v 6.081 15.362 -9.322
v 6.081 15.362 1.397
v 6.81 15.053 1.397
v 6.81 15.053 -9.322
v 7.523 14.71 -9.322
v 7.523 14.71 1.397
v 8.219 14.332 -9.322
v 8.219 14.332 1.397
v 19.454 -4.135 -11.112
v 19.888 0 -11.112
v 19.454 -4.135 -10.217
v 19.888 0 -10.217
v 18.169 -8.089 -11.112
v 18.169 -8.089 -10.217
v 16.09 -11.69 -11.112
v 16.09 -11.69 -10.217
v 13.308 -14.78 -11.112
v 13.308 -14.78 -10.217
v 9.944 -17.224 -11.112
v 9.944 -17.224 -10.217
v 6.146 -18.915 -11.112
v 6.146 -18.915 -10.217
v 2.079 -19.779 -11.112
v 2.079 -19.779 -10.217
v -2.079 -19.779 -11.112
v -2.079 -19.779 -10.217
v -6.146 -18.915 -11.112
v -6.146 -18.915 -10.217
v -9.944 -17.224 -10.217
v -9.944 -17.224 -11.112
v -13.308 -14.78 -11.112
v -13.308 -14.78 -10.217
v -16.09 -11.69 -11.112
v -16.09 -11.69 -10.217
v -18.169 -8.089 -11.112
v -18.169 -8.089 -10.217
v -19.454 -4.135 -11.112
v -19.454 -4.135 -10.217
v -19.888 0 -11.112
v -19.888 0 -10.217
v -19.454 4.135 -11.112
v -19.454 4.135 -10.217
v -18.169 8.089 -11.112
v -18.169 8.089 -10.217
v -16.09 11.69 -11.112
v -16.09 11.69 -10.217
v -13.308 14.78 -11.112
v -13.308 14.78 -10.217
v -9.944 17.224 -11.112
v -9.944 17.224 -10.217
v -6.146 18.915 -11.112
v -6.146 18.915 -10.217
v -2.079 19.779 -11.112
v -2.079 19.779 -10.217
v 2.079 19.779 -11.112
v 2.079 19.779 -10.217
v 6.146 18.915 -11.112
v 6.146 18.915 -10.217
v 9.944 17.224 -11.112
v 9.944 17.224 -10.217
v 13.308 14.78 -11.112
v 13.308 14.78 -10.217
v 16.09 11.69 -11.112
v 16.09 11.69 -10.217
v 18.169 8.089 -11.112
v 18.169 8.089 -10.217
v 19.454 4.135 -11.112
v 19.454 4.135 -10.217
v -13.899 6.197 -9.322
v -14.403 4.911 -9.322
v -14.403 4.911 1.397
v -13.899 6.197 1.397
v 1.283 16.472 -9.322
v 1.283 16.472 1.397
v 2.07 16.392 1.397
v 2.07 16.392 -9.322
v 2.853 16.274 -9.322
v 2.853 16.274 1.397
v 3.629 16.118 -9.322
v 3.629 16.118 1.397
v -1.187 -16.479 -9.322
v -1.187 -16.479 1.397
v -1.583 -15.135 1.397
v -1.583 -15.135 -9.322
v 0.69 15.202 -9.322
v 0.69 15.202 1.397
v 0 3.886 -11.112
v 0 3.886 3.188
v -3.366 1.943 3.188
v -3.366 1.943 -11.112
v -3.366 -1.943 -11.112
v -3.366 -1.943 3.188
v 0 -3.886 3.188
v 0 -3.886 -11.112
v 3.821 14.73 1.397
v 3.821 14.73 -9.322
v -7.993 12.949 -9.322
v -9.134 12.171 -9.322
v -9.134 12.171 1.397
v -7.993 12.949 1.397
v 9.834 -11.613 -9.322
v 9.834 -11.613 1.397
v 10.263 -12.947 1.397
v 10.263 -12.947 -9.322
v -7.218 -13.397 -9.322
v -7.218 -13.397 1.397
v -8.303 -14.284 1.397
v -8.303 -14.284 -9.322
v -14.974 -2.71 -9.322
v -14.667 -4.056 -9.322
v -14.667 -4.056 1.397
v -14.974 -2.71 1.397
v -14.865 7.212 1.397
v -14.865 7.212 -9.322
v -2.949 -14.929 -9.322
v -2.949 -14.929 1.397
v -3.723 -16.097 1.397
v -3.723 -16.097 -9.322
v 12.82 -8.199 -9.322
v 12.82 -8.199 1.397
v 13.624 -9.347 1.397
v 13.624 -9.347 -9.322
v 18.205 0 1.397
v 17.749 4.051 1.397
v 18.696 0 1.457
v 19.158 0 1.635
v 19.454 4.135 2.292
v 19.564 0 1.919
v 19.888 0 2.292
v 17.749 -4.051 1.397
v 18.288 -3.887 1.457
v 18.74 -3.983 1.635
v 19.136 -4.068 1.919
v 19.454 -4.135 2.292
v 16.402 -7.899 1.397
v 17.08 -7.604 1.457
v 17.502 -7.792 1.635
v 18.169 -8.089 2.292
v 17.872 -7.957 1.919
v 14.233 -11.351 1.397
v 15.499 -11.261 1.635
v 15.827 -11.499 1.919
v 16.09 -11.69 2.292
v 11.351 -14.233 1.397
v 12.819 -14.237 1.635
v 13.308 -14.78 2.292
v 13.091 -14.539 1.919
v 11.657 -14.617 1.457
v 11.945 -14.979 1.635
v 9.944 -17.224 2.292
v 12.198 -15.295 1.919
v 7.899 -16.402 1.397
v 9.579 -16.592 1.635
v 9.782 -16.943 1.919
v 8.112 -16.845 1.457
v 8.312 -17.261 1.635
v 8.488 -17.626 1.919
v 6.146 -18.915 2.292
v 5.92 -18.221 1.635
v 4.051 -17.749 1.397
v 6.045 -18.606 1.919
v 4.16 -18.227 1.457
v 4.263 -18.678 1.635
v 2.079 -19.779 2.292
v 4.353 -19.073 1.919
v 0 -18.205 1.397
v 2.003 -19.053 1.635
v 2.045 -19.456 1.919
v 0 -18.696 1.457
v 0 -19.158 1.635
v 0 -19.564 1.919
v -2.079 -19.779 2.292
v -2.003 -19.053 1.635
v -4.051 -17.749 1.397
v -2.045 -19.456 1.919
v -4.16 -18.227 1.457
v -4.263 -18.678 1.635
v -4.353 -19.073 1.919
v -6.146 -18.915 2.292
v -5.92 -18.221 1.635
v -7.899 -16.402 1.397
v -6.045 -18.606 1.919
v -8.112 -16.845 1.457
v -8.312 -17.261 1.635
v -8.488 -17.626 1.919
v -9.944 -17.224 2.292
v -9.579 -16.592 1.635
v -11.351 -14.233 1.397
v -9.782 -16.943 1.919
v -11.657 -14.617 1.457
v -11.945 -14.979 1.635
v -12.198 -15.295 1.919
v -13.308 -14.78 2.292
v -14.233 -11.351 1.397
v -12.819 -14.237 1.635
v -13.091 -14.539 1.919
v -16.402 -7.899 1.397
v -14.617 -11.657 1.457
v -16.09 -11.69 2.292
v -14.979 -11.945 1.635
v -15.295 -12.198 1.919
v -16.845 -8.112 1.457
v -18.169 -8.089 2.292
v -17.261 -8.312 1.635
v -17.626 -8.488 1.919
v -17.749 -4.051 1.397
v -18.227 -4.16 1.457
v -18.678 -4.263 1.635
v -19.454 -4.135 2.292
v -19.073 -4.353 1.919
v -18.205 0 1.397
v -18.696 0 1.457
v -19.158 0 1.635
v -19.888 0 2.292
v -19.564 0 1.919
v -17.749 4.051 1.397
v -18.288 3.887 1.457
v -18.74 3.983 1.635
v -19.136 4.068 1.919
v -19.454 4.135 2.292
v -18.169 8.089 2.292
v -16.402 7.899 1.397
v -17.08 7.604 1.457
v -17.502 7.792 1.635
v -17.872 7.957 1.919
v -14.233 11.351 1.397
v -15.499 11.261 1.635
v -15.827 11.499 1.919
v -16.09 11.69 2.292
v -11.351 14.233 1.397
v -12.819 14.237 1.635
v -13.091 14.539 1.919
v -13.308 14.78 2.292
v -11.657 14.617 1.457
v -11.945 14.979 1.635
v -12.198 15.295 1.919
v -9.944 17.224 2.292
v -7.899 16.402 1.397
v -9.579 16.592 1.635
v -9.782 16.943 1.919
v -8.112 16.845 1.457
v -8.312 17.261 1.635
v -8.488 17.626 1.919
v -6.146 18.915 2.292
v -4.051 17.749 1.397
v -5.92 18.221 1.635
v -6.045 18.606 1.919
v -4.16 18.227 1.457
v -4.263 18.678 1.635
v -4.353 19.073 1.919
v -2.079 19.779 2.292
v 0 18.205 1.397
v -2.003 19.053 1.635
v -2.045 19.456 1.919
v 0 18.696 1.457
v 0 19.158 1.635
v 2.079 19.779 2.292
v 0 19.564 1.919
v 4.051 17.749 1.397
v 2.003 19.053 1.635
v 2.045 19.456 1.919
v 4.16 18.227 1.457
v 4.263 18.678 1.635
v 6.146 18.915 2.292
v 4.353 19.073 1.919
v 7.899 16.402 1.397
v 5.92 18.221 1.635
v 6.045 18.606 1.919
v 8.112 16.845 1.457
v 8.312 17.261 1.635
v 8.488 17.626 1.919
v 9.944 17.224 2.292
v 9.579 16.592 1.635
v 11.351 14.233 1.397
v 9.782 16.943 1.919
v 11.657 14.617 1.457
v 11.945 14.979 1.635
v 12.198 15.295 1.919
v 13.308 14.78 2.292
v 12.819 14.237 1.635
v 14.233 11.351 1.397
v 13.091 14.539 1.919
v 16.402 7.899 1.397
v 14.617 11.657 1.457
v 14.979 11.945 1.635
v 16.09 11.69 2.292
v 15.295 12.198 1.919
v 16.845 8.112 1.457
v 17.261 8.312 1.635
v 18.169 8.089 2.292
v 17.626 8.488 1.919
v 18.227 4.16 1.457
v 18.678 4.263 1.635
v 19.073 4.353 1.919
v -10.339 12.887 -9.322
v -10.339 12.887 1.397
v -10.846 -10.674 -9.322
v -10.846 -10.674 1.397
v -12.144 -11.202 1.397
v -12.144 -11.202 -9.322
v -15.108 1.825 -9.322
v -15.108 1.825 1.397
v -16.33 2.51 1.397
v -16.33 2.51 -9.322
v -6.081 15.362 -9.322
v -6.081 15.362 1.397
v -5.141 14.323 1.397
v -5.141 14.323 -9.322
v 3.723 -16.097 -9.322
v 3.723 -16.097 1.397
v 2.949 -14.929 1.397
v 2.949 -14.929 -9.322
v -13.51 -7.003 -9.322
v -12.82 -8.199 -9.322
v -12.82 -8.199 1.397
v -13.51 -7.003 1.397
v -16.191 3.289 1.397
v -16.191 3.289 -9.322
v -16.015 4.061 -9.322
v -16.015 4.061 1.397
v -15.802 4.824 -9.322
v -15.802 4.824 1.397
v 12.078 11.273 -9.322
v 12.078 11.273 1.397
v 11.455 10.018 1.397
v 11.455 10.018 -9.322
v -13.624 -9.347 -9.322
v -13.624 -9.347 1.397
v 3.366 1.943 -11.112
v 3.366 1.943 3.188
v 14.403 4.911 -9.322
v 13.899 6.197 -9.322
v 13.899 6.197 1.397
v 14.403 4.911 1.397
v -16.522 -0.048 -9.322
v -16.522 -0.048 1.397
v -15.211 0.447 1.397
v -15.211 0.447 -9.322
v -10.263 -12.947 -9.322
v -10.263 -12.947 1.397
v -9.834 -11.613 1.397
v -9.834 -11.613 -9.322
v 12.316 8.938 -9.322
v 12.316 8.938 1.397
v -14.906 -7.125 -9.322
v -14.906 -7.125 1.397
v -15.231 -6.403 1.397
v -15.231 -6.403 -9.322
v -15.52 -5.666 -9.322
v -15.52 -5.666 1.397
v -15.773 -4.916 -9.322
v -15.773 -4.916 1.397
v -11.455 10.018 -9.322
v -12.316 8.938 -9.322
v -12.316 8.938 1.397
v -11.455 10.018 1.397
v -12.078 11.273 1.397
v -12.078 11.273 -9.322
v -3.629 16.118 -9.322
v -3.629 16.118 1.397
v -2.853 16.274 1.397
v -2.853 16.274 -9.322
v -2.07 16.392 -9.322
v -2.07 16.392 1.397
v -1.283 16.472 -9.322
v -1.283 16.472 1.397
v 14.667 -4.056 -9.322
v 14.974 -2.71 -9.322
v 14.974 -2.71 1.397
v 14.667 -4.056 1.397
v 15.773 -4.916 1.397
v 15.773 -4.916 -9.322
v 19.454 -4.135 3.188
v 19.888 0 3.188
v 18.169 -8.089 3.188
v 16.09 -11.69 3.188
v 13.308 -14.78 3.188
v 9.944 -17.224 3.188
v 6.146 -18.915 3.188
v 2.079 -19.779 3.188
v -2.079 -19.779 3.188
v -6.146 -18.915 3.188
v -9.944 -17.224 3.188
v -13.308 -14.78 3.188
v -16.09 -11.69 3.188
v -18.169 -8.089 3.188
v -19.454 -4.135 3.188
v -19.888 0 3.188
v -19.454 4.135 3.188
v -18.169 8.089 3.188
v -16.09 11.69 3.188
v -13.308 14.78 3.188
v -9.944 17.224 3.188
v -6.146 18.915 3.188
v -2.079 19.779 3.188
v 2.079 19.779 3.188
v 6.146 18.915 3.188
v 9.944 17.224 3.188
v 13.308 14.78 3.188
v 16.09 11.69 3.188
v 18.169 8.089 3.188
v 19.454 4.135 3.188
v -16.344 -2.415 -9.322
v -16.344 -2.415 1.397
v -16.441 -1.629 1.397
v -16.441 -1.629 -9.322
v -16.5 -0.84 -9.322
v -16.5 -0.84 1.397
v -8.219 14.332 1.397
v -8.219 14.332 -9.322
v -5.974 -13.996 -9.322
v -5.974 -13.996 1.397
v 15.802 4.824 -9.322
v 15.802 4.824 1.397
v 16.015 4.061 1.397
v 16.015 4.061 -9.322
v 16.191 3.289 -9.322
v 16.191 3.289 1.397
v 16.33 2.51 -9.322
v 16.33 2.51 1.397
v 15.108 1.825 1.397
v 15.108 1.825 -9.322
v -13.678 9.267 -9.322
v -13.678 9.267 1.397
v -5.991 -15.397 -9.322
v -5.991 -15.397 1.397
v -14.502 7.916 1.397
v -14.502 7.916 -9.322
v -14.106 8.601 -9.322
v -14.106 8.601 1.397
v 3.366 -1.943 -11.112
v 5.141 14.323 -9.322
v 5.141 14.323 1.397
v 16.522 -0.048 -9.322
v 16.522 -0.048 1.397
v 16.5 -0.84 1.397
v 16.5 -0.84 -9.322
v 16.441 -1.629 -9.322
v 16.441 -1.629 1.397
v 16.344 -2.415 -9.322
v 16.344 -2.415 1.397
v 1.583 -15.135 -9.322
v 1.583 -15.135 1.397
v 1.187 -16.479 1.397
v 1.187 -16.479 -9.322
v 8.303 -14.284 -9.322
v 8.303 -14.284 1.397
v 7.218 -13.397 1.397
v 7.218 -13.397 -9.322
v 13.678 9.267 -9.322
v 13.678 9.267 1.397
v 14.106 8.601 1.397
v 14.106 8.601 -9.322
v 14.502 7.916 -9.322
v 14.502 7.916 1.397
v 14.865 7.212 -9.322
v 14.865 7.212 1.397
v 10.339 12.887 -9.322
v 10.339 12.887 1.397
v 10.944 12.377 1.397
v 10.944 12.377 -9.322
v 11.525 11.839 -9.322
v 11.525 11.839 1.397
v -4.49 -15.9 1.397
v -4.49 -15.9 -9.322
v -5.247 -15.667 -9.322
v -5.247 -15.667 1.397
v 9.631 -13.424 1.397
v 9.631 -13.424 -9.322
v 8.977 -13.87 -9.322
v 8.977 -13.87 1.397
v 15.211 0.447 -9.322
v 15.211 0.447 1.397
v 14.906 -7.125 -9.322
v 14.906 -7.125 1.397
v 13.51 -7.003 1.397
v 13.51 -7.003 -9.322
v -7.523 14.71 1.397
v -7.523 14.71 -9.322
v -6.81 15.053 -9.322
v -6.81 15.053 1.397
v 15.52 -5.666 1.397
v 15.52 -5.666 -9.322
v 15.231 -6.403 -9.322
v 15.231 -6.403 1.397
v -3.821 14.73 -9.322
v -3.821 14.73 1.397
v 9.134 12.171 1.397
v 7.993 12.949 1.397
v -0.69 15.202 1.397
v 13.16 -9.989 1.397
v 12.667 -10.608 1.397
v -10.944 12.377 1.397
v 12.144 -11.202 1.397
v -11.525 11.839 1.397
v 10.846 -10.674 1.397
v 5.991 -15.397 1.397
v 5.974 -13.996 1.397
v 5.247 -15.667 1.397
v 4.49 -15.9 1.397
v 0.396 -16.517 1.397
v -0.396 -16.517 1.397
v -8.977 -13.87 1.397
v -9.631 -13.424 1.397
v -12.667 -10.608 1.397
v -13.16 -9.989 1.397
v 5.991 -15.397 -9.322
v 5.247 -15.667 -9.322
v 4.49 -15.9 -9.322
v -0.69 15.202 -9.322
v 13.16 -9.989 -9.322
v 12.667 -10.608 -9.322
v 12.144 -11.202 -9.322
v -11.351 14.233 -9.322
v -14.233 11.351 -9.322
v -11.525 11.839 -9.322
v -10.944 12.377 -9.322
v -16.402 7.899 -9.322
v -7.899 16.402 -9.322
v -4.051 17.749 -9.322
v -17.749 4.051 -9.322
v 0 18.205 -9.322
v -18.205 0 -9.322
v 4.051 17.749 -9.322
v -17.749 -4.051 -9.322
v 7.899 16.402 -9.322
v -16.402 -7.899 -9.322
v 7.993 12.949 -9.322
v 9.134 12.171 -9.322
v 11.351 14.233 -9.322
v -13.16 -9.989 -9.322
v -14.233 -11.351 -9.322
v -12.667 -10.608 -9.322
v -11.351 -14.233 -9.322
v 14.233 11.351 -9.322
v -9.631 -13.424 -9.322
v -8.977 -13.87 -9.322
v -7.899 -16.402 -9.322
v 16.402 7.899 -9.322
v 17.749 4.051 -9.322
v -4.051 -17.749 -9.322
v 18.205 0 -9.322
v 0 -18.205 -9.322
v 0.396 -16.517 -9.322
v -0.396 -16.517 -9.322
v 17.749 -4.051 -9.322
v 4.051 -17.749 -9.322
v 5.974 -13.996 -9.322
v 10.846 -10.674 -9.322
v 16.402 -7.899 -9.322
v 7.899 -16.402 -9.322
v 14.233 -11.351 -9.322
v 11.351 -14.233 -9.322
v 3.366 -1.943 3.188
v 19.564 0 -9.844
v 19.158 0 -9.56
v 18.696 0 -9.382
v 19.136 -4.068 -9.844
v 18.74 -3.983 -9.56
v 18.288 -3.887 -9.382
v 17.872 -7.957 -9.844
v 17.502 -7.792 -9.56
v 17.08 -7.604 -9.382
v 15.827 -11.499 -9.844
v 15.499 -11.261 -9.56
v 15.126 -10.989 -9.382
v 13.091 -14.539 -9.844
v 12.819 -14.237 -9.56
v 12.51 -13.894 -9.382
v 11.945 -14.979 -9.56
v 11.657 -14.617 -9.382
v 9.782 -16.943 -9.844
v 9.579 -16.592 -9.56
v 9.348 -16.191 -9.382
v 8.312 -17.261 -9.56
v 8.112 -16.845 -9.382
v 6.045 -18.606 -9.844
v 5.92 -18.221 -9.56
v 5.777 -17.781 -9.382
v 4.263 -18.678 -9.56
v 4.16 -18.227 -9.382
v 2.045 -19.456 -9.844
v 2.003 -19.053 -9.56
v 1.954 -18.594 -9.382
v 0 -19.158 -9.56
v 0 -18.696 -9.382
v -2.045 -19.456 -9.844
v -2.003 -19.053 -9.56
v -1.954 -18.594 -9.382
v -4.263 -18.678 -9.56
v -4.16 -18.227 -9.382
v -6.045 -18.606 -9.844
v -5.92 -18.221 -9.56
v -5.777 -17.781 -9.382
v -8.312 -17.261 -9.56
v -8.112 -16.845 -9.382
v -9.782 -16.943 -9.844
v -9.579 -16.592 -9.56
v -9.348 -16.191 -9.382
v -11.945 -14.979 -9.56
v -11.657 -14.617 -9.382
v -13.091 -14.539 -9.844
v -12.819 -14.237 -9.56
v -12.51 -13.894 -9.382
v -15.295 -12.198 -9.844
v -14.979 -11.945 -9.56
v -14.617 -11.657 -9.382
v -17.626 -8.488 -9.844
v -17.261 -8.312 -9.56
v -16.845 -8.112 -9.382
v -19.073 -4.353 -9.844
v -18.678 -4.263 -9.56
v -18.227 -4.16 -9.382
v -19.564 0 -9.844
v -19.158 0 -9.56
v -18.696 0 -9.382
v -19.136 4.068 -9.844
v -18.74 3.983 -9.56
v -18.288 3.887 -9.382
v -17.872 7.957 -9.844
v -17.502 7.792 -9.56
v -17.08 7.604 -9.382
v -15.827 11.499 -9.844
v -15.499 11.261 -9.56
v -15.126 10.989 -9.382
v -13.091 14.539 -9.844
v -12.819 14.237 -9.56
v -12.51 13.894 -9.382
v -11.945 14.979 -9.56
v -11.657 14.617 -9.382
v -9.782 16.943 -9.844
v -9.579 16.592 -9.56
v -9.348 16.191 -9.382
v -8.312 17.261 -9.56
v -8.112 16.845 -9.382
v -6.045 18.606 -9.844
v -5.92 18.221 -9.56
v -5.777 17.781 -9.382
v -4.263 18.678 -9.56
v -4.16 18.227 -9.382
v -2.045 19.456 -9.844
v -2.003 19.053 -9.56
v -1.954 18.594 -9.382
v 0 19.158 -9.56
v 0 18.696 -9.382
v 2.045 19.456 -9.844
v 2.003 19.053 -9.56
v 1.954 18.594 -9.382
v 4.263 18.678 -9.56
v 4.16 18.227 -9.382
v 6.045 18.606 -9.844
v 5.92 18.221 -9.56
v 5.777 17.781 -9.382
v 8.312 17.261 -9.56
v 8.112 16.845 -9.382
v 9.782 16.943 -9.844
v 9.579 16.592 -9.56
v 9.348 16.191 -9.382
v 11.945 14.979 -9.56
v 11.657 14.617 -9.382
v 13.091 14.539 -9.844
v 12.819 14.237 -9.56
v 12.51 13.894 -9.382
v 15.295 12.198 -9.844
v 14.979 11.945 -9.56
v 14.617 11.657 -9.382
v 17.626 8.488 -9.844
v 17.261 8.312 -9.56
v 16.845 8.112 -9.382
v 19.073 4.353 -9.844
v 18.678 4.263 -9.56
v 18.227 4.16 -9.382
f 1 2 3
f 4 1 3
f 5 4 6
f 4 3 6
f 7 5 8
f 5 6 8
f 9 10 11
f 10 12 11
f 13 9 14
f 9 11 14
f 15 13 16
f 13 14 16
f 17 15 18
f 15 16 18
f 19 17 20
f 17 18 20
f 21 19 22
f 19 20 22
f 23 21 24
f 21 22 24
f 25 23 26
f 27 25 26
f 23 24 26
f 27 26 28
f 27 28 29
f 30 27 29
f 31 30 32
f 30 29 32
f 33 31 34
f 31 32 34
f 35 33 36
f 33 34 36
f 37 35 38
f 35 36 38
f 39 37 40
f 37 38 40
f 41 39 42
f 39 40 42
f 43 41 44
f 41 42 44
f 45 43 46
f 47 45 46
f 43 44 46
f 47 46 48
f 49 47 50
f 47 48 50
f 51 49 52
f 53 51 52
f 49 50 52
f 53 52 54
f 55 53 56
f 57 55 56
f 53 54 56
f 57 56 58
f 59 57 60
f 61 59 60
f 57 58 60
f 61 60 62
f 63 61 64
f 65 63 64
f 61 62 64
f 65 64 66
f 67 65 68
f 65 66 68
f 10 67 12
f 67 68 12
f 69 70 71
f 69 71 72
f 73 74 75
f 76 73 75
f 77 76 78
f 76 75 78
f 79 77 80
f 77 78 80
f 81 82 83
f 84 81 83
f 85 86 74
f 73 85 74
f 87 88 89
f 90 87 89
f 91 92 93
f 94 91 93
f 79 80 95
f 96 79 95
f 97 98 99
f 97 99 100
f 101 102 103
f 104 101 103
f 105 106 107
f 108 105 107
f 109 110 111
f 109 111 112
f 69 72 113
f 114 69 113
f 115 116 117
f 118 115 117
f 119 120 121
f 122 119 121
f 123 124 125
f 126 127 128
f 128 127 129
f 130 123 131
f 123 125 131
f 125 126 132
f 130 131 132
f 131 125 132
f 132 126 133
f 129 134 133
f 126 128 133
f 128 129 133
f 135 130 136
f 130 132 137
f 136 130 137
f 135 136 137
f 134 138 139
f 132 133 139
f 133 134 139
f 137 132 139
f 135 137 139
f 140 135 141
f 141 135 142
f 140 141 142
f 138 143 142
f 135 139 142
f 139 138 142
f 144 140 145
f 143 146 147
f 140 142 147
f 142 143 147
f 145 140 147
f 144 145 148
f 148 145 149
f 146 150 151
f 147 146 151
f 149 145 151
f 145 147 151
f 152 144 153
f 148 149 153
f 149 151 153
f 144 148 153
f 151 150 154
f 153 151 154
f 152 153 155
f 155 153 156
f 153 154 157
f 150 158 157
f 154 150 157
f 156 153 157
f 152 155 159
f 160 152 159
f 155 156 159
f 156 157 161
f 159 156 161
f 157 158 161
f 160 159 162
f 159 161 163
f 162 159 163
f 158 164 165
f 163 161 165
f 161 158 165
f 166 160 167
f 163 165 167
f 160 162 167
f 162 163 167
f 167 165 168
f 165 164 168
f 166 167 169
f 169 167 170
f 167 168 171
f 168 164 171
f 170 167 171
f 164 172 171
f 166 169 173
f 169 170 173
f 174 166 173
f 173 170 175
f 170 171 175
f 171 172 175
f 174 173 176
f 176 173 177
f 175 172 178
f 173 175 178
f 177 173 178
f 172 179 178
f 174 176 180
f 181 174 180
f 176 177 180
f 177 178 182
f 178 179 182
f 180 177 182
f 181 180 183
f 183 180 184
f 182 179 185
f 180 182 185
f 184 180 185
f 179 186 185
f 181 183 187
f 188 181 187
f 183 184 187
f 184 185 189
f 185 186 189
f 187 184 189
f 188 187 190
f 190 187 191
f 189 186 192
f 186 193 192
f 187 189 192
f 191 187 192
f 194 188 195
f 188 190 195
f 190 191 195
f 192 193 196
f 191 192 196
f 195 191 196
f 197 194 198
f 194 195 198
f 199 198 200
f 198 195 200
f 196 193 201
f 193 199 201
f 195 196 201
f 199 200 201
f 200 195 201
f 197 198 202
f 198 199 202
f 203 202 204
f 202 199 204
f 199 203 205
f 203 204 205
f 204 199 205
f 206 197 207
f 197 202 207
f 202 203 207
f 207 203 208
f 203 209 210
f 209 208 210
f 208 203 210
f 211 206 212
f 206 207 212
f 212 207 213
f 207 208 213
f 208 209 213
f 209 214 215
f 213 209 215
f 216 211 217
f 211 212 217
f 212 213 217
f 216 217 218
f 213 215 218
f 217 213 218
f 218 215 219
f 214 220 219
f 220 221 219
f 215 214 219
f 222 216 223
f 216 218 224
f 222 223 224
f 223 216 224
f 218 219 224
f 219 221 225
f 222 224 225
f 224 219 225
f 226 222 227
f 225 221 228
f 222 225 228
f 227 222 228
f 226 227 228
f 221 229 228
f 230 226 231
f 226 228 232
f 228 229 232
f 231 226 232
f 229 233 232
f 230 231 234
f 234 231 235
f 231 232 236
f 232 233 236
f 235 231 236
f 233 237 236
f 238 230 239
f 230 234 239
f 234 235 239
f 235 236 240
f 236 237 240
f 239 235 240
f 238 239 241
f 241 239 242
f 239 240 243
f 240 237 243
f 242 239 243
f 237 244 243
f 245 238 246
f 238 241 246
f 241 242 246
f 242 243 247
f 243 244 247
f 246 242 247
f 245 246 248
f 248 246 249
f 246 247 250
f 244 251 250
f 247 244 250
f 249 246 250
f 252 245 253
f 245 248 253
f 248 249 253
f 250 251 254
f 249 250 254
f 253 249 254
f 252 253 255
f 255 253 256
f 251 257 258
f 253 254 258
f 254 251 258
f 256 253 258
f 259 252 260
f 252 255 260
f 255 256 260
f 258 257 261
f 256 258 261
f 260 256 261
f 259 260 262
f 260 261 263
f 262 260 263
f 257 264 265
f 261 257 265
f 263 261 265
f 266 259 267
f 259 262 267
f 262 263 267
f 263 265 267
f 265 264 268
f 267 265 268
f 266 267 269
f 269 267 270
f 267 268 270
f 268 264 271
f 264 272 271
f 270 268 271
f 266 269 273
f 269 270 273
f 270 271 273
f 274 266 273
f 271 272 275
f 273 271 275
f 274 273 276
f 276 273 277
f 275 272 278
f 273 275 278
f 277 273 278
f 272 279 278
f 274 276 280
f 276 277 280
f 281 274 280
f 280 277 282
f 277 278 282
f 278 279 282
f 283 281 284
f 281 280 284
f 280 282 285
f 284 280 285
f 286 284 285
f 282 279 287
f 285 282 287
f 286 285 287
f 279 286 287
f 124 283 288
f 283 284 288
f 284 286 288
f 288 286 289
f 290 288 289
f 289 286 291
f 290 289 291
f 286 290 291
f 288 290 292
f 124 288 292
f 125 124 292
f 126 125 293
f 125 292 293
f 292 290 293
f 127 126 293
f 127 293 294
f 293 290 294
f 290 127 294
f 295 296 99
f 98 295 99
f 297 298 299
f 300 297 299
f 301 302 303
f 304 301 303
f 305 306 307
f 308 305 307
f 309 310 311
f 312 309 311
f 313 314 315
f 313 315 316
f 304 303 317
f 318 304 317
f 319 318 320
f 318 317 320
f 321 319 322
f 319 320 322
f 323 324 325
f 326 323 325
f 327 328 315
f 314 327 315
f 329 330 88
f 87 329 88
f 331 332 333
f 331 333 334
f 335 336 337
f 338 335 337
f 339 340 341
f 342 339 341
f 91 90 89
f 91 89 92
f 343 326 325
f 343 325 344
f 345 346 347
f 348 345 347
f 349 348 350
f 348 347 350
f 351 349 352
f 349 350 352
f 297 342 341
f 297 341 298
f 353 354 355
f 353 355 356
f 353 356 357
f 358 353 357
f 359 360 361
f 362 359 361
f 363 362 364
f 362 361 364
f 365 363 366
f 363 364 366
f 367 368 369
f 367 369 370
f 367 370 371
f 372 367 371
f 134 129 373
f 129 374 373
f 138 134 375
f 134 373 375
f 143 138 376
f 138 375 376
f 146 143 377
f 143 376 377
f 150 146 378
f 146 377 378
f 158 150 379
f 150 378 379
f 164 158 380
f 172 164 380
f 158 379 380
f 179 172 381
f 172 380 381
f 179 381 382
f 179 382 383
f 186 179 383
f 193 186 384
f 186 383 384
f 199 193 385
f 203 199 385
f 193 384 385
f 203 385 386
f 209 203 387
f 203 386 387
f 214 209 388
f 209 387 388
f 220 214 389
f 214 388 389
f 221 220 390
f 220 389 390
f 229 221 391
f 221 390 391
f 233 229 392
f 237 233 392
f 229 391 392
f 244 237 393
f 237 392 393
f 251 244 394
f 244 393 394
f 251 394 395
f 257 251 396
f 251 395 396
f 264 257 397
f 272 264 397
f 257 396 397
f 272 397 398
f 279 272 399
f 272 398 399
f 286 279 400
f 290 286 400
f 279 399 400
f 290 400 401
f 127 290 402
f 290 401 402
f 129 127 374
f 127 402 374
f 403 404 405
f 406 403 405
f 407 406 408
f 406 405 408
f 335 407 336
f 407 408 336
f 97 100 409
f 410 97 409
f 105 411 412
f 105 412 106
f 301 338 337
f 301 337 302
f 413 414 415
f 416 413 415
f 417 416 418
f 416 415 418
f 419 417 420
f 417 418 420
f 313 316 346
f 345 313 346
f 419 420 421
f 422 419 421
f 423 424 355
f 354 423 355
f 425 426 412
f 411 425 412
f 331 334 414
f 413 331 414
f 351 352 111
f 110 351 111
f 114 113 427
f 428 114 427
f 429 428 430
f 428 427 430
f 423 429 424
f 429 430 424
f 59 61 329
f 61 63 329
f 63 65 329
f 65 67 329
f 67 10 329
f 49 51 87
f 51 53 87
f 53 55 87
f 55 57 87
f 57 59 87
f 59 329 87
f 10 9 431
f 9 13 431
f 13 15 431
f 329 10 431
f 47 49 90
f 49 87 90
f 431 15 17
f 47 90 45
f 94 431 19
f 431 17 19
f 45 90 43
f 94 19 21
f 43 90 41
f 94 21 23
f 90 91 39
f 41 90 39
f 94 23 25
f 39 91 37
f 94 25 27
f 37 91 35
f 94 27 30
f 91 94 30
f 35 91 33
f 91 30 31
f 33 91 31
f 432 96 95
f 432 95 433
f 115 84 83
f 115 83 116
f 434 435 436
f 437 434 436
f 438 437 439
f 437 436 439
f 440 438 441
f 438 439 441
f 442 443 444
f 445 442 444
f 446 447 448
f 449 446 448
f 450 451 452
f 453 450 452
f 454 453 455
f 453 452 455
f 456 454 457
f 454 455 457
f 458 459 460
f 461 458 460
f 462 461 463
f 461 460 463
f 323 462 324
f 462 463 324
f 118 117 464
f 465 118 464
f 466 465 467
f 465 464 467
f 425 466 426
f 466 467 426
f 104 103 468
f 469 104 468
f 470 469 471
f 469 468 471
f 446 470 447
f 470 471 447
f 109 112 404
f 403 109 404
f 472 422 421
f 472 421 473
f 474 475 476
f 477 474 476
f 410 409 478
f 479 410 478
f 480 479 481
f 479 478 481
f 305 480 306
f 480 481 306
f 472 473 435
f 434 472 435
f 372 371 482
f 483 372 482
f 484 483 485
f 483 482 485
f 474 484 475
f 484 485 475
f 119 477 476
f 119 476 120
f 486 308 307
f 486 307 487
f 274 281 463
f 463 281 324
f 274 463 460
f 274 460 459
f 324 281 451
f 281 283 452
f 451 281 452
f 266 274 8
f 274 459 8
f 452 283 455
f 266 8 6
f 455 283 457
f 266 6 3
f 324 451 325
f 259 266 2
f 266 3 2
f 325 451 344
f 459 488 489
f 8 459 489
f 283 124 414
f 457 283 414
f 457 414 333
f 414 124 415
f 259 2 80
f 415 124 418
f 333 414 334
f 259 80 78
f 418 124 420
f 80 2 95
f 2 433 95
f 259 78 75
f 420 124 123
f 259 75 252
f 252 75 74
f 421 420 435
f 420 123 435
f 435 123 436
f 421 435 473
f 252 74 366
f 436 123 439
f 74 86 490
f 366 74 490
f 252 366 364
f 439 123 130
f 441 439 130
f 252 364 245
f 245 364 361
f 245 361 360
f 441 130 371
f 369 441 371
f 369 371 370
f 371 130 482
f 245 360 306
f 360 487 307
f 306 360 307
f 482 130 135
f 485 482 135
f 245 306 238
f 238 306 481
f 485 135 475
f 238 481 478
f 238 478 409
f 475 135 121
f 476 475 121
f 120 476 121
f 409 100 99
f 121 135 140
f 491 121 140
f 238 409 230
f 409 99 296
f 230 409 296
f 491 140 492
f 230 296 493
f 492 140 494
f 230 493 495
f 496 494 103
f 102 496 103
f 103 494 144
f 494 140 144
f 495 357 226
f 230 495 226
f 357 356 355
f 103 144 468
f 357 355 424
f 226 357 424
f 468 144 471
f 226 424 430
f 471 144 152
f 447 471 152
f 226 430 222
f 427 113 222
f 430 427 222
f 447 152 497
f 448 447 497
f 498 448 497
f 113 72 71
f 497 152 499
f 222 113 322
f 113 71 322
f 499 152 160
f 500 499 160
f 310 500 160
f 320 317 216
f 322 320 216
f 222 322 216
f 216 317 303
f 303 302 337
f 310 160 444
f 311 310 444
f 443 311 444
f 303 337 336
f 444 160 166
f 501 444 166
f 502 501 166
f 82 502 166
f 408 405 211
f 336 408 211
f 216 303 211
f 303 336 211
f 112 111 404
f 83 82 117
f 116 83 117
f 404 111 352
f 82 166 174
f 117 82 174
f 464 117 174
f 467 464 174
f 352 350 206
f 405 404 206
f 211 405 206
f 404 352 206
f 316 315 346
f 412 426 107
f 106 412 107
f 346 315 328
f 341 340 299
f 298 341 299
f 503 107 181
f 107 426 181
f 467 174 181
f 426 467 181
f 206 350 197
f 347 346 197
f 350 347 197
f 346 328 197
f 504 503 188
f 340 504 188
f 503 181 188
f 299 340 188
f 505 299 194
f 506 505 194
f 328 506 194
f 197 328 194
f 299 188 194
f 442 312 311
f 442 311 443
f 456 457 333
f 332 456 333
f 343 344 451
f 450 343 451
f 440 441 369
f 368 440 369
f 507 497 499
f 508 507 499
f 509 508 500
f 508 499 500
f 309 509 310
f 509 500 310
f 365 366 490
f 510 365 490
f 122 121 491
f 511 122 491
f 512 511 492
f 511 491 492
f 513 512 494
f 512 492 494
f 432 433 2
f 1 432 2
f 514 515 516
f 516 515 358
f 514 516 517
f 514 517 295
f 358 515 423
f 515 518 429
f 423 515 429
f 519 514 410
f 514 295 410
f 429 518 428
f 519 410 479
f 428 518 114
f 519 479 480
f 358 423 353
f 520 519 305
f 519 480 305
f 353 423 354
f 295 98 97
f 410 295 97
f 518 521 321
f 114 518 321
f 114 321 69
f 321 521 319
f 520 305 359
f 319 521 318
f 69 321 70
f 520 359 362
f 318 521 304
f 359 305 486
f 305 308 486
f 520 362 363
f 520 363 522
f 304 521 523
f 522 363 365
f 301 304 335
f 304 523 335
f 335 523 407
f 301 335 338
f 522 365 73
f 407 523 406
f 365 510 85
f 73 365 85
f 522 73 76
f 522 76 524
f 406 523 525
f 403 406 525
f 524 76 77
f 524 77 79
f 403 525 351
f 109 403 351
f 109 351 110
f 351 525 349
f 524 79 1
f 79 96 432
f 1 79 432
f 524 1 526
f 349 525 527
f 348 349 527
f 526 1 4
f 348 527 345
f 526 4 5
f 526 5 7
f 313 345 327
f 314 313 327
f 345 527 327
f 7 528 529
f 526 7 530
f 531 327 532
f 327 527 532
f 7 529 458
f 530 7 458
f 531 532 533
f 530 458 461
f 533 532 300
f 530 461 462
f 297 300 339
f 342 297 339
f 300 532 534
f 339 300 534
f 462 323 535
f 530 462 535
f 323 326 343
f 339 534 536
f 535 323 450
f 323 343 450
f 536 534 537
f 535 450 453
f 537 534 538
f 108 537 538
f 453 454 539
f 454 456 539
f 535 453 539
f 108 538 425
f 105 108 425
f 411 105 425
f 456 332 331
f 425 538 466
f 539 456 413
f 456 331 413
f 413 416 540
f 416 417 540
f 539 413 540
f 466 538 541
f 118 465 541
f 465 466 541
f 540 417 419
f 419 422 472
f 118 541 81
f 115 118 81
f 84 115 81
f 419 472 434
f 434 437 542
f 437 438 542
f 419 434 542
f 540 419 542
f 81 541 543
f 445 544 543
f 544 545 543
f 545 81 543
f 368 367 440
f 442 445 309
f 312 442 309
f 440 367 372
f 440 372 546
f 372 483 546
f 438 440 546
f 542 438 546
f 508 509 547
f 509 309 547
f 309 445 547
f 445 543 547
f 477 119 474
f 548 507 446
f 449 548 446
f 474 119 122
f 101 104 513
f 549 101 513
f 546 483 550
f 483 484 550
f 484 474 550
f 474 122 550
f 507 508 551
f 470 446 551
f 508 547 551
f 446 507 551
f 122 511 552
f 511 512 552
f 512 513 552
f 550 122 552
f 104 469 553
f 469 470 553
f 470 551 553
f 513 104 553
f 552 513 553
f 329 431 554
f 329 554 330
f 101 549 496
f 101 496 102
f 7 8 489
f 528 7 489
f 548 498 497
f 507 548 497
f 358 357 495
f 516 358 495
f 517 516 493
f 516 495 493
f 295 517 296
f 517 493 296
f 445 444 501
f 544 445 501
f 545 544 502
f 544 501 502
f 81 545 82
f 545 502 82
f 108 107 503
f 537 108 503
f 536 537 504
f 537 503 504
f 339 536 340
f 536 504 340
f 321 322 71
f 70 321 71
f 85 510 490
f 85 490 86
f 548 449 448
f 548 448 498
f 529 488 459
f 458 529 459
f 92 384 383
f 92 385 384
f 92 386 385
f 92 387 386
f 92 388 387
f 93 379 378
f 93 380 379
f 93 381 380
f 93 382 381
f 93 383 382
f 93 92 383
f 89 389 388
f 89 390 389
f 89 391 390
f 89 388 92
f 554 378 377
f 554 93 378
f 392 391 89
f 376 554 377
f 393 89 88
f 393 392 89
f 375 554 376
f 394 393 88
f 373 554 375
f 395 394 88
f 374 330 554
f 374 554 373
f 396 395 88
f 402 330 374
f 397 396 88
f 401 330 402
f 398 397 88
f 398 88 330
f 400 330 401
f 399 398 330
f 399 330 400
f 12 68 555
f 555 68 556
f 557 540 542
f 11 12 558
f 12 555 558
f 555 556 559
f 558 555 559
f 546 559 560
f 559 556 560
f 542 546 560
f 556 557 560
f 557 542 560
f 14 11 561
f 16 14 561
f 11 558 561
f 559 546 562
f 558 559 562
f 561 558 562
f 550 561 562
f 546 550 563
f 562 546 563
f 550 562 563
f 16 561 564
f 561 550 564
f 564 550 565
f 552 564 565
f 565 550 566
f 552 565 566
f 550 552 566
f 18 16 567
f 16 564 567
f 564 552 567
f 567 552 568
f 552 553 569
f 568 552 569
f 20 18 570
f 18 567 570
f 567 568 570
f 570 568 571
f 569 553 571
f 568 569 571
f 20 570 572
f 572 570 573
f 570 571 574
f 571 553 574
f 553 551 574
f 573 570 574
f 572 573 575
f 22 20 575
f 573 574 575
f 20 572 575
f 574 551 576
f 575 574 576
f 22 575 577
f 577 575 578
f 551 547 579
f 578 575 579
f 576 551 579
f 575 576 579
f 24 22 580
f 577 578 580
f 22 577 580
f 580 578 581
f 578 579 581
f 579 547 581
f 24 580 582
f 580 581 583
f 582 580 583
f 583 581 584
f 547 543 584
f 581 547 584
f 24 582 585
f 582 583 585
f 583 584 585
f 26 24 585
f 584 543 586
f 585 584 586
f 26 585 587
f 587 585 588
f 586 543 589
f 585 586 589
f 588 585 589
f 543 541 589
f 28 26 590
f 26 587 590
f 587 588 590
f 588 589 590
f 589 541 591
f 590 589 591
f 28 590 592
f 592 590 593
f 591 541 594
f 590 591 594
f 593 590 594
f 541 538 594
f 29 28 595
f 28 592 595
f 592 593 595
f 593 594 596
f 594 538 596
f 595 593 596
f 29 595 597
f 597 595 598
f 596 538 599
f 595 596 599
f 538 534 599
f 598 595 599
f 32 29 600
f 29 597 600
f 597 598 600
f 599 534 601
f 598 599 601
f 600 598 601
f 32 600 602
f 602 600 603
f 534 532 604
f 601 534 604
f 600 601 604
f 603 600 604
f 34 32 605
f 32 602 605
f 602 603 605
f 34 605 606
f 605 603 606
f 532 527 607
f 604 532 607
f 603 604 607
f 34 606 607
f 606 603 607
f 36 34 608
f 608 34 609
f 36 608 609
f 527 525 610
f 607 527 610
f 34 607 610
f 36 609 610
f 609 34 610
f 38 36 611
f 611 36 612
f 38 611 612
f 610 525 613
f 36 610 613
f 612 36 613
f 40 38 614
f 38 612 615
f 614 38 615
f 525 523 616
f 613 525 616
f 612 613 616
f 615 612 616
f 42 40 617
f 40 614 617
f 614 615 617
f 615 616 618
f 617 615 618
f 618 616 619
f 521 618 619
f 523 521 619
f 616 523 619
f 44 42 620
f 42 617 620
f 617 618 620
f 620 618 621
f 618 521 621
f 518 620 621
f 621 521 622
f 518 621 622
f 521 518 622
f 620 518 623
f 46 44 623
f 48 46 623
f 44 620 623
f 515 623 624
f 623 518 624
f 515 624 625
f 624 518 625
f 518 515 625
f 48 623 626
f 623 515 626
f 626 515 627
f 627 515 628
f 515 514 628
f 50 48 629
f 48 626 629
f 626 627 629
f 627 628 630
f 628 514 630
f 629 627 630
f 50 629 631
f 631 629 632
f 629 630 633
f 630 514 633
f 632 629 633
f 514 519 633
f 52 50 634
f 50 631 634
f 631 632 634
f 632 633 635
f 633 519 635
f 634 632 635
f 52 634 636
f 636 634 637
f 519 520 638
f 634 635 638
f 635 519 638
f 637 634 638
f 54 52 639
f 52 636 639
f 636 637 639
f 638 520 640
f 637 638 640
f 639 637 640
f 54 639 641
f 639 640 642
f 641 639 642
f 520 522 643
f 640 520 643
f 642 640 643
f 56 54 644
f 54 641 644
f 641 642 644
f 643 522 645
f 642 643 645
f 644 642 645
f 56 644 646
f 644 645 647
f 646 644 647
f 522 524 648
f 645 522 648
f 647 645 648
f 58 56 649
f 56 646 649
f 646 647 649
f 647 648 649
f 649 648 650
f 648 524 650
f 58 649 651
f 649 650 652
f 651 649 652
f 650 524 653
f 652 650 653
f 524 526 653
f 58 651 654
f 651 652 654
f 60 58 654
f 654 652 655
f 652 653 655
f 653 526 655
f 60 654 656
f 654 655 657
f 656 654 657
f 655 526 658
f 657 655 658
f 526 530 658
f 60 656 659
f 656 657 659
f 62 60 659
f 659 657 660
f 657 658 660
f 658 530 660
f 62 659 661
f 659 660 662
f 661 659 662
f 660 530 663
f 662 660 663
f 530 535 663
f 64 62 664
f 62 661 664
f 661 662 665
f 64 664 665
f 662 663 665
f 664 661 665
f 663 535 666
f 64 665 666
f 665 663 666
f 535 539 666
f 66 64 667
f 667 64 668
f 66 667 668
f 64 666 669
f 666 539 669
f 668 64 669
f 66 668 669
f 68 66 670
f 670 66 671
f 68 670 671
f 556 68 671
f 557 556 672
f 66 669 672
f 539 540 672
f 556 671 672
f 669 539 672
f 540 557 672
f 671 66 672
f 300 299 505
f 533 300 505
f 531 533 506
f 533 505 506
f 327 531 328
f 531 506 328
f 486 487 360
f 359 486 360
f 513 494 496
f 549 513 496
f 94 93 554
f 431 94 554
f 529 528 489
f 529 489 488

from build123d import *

# Parameters (mm, degrees)
CUT_EXTRUDE1_START = 1.397
CUT_EXTRUDE1_DEPTH = 10.7188
CIRPATTERN1_COUNT  = 21
SKETCH4_R          = 1.5875
CUT_EXTRUDE2_DEPTH = 31.241836167
CUT_EXTRUDE3_DEPTH = 1.190625
CIRPATTERN2_COUNT  = 2
CIRPATTERN2_ANGLE  = 90
CUT_EXTRUDE4_DEPTH = 50.8
SKETCH8_R          = 12.7
CUT_EXTRUDE5_DEPTH = 50.8


with BuildPart() as part:
    # Sketch2 → Revolve1 (revolve)
    with BuildSketch(Plane(origin=(0, 0, 0), x_dir=(0, 0, -1), z_dir=(1, 0, 0)), mode=Mode.PRIVATE) as revolve1_sk:
        with BuildLine():
            Line((-11.1125, 3.175), (11.1125, 3.175))
            Line((11.1125, 3.175), (11.1125, 19.8882))
            Line((11.1125, 19.8882), (10.21715, 19.8882))
            ThreePointArc((10.21715, 19.8882), (9.559562343, 19.158250378), (9.3218, 18.204983865))
            Line((9.3218, 18.204983865), (9.3218, 16.521767729))
            Line((9.3218, 16.521767729), (-1.397, 16.521767729))
            Line((-1.397, 16.521767729), (-1.397, 18.204983865))
            ThreePointArc((-1.397, 18.204983865), (-1.634762343, 19.158250378), (-2.29235, 19.8882))
            Line((-2.29235, 19.8882), (-3.1877, 19.8882))
            Line((-3.1877, 19.8882), (-3.1877, 11.9126))
            Line((-3.1877, 11.9126), (-11.1125, 11.9126))
            Line((-11.1125, 11.9126), (-11.1125, 3.175))
        make_face()
    revolve(revolve1_sk.sketch.rotate(Axis((0, 0, 11.1125), (0, 0, -1)), 90), axis=Axis((0, 0, 11.1125), (0, 0, -1)))

    # Sketch3 → Cut-Extrude1 (cut)
    with BuildSketch(Plane.XY.offset(CUT_EXTRUDE1_START)):
        with BuildLine():
            Line((-0.690489274, 15.2019), (0.690489274, 15.2019))
            Line((0.690489274, 15.2019), (1.2827, 16.4719))
            ThreePointArc((1.2827, 16.4719), (0, 16.521767729), (-1.2827, 16.4719))
            Line((-1.2827, 16.4719), (-0.690489274, 15.2019))
        make_face()
    cut_extrude1 = extrude(amount=-CUT_EXTRUDE1_DEPTH, mode=Mode.SUBTRACT)

    # CirPattern1: Cut-Extrude1 ×21 about axis
    cirpattern1_axis = Axis((0, 0, 0), (0, 0, 1))
    for i in range(1, CIRPATTERN1_COUNT):
        add(cut_extrude1.rotate(cirpattern1_axis, i * 360 / CIRPATTERN1_COUNT), mode=Mode.SUBTRACT)

    # Sketch4 → Cut-Extrude2 (cut, through all)
    with BuildSketch(Plane(origin=(0, 0, 0), x_dir=(1, 0, 0), z_dir=(0, 1, 0))):
        with Locations(Location((0, -7.1501, 0), (0, 0, 90))):
            Circle(SKETCH4_R)
    cut_extrude2 = extrude(amount=CUT_EXTRUDE2_DEPTH, mode=Mode.SUBTRACT)

    # Sketch5 → Revolve2 (revolve)
    with BuildSketch(Plane.XY.offset(7.1501), mode=Mode.PRIVATE) as revolve2_sk:
        Polygon((1.0795, 11.806349246), (1.5875, 11.298349246), (1.5875, 3.81), (0.9525, 3.175), (0, 3.175), (0, 11.806349246), align=None)
    revolve2 = revolve(revolve2_sk.sketch.rotate(Axis((0, 0, 7.1501), (0, 1, 0)), 90), axis=Axis((0, 0, 7.1501), (0, 1, 0)))

    # Sketch6 → Cut-Extrude3 (cut)
    with BuildSketch(Plane(origin=(0, 11.806349246, 0), x_dir=(1, 0, 0), z_dir=(0, 1, 0))):
        Polygon((0, -6.233556448), (-0.79375, -6.691828224), (-0.79375, -7.608371776), (0, -8.066643552), (0.79375, -7.608371776), (0.79375, -6.691828224), align=None)
    cut_extrude3 = extrude(amount=-CUT_EXTRUDE3_DEPTH, mode=Mode.SUBTRACT)

    # CirPattern2: Cut-Extrude2, Revolve2, Cut-Extrude3 ×2 about axis
    cirpattern2_axis = Axis((0, 0, 0), (0, 0, -1))
    add([cut_extrude2.rotate(cirpattern2_axis, i * CIRPATTERN2_ANGLE / (CIRPATTERN2_COUNT - 1)) for i in range(1, CIRPATTERN2_COUNT)], mode=Mode.SUBTRACT)
    add([revolve2.rotate(cirpattern2_axis, i * CIRPATTERN2_ANGLE / (CIRPATTERN2_COUNT - 1)) for i in range(1, CIRPATTERN2_COUNT)])
    add([cut_extrude3.rotate(cirpattern2_axis, i * CIRPATTERN2_ANGLE / (CIRPATTERN2_COUNT - 1)) for i in range(1, CIRPATTERN2_COUNT)], mode=Mode.SUBTRACT)

    # Sketch7 → Cut-Extrude4 (cut)
    with BuildSketch(Plane.XY.offset(11.1125)):
        Polygon((0, 3.886144662), (-3.3655, 1.943072331), (-3.3655, -1.943072331), (0, -3.886144662), (3.3655, -1.943072331), (3.3655, 1.943072331), align=None)
    extrude(amount=-CUT_EXTRUDE4_DEPTH, mode=Mode.SUBTRACT)

    # Sketch8 → Cut-Extrude5 (cut)
    with BuildSketch(Plane.XY.offset(3.1877)):
        Circle(SKETCH8_R)
    extrude(amount=CUT_EXTRUDE5_DEPTH, mode=Mode.SUBTRACT)


solid = part.part
